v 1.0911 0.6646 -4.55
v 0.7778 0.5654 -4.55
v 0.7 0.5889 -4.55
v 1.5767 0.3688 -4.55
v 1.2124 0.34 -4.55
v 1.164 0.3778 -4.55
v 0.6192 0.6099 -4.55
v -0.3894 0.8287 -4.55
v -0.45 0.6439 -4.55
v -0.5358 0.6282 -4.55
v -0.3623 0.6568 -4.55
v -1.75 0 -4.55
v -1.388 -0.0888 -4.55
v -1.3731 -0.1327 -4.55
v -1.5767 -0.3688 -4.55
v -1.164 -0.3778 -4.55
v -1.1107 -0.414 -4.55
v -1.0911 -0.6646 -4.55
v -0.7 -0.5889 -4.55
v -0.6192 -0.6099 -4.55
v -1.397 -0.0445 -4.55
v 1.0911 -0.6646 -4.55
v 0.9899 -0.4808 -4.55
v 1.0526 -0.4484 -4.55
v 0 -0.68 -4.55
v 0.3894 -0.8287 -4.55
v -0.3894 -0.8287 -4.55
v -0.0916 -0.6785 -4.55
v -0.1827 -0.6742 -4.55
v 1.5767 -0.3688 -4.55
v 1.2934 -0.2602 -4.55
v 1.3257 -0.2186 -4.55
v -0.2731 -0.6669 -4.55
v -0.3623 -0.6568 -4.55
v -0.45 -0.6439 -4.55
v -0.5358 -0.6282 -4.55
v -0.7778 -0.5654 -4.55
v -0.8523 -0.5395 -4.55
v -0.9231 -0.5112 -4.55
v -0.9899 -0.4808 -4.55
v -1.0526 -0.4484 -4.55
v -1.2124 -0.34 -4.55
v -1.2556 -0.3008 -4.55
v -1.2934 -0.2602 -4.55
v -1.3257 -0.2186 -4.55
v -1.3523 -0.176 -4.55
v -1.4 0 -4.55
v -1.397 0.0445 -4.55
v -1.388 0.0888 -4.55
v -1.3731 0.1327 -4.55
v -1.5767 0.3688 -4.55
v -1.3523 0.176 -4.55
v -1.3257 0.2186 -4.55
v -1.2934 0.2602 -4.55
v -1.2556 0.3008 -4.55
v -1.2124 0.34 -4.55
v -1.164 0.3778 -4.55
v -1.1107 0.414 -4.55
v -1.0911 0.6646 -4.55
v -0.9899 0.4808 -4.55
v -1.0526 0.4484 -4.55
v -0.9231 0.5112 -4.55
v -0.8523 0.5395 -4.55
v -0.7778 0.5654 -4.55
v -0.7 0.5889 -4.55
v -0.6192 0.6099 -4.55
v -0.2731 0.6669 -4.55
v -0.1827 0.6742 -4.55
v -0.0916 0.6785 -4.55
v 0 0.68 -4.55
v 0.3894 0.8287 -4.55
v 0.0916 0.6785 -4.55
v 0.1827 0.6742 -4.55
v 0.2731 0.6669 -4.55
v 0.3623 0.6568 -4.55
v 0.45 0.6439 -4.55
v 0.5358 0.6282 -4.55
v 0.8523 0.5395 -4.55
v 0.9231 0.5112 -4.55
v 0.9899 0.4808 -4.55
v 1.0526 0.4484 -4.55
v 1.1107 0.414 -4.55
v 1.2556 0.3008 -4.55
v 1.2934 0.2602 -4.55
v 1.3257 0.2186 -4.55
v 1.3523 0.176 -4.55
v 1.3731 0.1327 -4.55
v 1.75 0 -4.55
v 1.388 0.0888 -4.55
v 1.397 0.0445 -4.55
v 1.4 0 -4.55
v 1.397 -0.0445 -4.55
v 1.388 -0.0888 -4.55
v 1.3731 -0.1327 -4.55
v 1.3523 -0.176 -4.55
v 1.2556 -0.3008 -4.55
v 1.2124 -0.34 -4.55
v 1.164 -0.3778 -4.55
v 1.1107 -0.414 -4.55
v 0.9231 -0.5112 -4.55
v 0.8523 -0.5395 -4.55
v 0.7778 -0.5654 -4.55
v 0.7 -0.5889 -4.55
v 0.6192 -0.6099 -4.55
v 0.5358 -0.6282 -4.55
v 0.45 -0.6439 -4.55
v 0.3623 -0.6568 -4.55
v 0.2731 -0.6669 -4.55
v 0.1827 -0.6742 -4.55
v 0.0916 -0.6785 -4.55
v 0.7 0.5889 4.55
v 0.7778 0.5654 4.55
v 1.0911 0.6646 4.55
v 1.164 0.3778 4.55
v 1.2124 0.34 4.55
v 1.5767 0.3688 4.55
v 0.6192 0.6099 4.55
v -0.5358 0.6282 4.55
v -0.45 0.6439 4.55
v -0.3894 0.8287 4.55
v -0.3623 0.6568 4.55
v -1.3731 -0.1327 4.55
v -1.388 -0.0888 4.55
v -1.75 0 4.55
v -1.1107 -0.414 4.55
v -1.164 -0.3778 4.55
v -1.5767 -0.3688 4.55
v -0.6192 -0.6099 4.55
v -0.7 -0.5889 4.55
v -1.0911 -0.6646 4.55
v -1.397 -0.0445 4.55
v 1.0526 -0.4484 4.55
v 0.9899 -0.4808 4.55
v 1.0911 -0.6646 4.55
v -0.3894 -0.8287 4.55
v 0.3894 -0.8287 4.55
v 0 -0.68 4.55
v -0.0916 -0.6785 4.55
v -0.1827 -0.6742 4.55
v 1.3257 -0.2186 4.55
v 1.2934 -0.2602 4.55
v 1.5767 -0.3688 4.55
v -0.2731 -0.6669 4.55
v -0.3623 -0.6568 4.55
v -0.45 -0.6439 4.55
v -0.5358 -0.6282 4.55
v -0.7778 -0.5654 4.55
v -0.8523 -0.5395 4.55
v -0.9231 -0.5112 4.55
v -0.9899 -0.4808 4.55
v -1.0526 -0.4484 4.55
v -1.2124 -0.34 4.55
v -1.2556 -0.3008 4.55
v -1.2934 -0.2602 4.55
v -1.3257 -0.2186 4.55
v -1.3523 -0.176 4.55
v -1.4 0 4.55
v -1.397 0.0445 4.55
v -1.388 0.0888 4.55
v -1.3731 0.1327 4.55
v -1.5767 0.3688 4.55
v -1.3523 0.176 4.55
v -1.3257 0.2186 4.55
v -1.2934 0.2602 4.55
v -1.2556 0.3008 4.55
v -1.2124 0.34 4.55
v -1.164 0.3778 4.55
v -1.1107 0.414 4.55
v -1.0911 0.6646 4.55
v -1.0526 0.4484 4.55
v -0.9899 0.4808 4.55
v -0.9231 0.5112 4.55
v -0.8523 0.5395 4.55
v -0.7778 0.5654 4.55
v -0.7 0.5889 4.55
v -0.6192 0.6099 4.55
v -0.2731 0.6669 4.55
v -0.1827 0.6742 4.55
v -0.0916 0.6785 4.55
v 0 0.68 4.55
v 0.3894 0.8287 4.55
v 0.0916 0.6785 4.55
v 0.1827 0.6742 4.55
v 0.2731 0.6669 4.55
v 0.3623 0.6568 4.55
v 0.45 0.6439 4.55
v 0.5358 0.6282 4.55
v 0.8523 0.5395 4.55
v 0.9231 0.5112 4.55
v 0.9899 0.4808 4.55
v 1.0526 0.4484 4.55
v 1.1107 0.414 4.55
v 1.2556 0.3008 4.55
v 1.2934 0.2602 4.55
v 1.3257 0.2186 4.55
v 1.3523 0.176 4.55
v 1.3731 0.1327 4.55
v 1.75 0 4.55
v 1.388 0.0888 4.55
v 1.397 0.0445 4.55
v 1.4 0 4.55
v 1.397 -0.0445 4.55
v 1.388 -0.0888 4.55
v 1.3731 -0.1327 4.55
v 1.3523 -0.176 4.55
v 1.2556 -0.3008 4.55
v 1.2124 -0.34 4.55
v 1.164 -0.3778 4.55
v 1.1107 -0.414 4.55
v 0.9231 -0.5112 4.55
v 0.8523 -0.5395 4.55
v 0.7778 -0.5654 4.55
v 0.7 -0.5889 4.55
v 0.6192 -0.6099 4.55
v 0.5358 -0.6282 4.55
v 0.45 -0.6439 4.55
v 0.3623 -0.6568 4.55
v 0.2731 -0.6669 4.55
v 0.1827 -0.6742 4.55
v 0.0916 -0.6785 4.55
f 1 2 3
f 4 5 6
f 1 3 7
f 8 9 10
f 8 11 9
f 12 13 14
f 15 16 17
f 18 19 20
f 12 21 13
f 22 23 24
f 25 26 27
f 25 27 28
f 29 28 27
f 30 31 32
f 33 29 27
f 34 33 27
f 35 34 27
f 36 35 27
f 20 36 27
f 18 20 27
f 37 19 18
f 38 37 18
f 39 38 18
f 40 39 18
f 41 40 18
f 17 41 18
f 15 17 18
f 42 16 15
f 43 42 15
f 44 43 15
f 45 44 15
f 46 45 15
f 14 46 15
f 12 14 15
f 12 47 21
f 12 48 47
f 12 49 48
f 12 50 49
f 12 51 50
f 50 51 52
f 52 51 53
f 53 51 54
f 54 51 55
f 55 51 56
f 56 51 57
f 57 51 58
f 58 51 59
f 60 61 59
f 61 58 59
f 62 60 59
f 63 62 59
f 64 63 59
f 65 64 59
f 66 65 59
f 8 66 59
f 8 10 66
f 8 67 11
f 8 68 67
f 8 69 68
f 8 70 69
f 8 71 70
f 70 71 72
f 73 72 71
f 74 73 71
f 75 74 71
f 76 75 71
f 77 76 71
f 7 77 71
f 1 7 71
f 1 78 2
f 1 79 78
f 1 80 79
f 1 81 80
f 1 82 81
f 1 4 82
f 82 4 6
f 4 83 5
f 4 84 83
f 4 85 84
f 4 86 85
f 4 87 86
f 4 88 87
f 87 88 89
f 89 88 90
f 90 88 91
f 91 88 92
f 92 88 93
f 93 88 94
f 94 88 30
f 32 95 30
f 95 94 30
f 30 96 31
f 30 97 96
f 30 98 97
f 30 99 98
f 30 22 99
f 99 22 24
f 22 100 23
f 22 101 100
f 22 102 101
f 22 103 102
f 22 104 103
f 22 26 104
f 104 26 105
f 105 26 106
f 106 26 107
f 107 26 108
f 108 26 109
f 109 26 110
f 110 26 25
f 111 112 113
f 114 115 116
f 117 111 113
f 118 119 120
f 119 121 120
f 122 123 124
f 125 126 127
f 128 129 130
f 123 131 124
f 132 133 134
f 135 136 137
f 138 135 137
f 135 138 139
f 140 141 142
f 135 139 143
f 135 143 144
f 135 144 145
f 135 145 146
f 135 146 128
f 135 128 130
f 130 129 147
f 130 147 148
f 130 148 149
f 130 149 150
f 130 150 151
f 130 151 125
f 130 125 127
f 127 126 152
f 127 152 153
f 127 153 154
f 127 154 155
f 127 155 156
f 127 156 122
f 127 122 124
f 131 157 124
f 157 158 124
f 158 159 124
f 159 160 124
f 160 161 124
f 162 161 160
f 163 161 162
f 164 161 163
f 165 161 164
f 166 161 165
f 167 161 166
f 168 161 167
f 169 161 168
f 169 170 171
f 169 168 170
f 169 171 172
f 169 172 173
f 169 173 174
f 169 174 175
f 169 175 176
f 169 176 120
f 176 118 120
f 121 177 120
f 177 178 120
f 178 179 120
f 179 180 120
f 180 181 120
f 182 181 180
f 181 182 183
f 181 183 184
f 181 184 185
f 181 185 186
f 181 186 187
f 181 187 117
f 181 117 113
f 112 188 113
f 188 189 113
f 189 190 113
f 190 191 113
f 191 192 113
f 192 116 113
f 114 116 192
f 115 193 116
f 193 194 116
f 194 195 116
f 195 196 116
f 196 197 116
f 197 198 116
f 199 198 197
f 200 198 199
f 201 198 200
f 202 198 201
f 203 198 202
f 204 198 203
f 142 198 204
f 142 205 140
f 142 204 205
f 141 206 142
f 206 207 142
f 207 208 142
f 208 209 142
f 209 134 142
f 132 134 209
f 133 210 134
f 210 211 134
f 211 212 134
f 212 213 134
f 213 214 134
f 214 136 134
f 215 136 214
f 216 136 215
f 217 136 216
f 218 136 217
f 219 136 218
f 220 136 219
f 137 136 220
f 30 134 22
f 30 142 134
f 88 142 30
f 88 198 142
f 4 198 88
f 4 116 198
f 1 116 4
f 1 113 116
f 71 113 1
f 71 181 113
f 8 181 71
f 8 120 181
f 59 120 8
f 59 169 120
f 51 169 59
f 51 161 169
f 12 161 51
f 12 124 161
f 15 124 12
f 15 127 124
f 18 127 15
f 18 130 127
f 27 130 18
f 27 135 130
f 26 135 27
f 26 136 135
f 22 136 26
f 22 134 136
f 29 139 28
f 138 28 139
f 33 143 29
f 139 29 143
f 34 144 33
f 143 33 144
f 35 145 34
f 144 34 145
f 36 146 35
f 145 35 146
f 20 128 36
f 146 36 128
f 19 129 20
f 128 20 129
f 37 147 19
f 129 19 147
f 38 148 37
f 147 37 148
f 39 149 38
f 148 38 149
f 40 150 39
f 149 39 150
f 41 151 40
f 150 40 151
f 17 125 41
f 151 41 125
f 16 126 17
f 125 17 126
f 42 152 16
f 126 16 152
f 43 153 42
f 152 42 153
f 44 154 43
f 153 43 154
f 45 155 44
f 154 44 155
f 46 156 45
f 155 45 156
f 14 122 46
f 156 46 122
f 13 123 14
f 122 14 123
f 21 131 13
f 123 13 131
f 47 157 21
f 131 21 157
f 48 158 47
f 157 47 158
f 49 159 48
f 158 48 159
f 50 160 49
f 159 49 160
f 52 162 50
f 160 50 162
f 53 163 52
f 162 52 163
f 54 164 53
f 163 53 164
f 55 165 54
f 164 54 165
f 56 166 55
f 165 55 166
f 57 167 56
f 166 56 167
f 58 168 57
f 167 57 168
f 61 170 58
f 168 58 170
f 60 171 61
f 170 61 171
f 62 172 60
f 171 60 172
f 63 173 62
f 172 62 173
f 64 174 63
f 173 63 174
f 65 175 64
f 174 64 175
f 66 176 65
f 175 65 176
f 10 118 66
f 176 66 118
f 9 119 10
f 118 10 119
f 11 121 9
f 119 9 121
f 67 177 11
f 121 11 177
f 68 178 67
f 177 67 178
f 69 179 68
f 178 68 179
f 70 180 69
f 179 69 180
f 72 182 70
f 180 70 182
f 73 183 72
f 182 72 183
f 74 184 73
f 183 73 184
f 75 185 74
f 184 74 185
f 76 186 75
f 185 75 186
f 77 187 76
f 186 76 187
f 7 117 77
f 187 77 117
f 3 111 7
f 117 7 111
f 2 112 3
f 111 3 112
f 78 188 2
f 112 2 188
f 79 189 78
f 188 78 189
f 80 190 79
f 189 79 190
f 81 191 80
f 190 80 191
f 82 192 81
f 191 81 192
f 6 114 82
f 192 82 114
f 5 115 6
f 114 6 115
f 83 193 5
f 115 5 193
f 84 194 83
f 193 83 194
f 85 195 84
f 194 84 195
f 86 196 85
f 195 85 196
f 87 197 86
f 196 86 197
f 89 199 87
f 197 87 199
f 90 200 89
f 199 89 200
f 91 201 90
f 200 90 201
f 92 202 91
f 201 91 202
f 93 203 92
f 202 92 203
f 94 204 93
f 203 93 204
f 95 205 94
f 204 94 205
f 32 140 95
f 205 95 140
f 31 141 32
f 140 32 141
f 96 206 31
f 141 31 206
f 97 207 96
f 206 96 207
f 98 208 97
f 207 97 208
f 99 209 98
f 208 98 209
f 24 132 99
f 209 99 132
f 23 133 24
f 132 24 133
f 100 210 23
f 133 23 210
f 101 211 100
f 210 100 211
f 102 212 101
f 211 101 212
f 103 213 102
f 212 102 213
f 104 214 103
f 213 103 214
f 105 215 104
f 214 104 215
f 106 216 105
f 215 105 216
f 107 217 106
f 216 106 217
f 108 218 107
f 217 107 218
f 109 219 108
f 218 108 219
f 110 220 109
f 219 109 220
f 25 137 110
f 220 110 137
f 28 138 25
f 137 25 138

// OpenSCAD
$fn=96;

bbox_x = 3.5;
bbox_y = 1.7;
bbox_z = 9.1;

len = bbox_z;

outer_r = bbox_x/2;
wall = 0.35;
inner_r = outer_r - wall;

arc_deg = 140;

facets = 14;

module ring_segment_2d(ro, ri, ang){
    difference(){
        intersection(){
            difference(){
                circle(r=ro, $fn=facets);
                circle(r=ri, $fn=96);
            }
            rotate(-ang/2) circle(r=ro*3, $fn=96);
            rotate( ang/2) circle(r=ro*3, $fn=96);
        }
    }
}

module sleeve_segment(){
    linear_extrude(height=len, center=true, convexity=10)
        ring_segment_2d(outer_r, inner_r, arc_deg);
}

scale([1, bbox_y/(2*outer_r), 1])
    sleeve_segment();
